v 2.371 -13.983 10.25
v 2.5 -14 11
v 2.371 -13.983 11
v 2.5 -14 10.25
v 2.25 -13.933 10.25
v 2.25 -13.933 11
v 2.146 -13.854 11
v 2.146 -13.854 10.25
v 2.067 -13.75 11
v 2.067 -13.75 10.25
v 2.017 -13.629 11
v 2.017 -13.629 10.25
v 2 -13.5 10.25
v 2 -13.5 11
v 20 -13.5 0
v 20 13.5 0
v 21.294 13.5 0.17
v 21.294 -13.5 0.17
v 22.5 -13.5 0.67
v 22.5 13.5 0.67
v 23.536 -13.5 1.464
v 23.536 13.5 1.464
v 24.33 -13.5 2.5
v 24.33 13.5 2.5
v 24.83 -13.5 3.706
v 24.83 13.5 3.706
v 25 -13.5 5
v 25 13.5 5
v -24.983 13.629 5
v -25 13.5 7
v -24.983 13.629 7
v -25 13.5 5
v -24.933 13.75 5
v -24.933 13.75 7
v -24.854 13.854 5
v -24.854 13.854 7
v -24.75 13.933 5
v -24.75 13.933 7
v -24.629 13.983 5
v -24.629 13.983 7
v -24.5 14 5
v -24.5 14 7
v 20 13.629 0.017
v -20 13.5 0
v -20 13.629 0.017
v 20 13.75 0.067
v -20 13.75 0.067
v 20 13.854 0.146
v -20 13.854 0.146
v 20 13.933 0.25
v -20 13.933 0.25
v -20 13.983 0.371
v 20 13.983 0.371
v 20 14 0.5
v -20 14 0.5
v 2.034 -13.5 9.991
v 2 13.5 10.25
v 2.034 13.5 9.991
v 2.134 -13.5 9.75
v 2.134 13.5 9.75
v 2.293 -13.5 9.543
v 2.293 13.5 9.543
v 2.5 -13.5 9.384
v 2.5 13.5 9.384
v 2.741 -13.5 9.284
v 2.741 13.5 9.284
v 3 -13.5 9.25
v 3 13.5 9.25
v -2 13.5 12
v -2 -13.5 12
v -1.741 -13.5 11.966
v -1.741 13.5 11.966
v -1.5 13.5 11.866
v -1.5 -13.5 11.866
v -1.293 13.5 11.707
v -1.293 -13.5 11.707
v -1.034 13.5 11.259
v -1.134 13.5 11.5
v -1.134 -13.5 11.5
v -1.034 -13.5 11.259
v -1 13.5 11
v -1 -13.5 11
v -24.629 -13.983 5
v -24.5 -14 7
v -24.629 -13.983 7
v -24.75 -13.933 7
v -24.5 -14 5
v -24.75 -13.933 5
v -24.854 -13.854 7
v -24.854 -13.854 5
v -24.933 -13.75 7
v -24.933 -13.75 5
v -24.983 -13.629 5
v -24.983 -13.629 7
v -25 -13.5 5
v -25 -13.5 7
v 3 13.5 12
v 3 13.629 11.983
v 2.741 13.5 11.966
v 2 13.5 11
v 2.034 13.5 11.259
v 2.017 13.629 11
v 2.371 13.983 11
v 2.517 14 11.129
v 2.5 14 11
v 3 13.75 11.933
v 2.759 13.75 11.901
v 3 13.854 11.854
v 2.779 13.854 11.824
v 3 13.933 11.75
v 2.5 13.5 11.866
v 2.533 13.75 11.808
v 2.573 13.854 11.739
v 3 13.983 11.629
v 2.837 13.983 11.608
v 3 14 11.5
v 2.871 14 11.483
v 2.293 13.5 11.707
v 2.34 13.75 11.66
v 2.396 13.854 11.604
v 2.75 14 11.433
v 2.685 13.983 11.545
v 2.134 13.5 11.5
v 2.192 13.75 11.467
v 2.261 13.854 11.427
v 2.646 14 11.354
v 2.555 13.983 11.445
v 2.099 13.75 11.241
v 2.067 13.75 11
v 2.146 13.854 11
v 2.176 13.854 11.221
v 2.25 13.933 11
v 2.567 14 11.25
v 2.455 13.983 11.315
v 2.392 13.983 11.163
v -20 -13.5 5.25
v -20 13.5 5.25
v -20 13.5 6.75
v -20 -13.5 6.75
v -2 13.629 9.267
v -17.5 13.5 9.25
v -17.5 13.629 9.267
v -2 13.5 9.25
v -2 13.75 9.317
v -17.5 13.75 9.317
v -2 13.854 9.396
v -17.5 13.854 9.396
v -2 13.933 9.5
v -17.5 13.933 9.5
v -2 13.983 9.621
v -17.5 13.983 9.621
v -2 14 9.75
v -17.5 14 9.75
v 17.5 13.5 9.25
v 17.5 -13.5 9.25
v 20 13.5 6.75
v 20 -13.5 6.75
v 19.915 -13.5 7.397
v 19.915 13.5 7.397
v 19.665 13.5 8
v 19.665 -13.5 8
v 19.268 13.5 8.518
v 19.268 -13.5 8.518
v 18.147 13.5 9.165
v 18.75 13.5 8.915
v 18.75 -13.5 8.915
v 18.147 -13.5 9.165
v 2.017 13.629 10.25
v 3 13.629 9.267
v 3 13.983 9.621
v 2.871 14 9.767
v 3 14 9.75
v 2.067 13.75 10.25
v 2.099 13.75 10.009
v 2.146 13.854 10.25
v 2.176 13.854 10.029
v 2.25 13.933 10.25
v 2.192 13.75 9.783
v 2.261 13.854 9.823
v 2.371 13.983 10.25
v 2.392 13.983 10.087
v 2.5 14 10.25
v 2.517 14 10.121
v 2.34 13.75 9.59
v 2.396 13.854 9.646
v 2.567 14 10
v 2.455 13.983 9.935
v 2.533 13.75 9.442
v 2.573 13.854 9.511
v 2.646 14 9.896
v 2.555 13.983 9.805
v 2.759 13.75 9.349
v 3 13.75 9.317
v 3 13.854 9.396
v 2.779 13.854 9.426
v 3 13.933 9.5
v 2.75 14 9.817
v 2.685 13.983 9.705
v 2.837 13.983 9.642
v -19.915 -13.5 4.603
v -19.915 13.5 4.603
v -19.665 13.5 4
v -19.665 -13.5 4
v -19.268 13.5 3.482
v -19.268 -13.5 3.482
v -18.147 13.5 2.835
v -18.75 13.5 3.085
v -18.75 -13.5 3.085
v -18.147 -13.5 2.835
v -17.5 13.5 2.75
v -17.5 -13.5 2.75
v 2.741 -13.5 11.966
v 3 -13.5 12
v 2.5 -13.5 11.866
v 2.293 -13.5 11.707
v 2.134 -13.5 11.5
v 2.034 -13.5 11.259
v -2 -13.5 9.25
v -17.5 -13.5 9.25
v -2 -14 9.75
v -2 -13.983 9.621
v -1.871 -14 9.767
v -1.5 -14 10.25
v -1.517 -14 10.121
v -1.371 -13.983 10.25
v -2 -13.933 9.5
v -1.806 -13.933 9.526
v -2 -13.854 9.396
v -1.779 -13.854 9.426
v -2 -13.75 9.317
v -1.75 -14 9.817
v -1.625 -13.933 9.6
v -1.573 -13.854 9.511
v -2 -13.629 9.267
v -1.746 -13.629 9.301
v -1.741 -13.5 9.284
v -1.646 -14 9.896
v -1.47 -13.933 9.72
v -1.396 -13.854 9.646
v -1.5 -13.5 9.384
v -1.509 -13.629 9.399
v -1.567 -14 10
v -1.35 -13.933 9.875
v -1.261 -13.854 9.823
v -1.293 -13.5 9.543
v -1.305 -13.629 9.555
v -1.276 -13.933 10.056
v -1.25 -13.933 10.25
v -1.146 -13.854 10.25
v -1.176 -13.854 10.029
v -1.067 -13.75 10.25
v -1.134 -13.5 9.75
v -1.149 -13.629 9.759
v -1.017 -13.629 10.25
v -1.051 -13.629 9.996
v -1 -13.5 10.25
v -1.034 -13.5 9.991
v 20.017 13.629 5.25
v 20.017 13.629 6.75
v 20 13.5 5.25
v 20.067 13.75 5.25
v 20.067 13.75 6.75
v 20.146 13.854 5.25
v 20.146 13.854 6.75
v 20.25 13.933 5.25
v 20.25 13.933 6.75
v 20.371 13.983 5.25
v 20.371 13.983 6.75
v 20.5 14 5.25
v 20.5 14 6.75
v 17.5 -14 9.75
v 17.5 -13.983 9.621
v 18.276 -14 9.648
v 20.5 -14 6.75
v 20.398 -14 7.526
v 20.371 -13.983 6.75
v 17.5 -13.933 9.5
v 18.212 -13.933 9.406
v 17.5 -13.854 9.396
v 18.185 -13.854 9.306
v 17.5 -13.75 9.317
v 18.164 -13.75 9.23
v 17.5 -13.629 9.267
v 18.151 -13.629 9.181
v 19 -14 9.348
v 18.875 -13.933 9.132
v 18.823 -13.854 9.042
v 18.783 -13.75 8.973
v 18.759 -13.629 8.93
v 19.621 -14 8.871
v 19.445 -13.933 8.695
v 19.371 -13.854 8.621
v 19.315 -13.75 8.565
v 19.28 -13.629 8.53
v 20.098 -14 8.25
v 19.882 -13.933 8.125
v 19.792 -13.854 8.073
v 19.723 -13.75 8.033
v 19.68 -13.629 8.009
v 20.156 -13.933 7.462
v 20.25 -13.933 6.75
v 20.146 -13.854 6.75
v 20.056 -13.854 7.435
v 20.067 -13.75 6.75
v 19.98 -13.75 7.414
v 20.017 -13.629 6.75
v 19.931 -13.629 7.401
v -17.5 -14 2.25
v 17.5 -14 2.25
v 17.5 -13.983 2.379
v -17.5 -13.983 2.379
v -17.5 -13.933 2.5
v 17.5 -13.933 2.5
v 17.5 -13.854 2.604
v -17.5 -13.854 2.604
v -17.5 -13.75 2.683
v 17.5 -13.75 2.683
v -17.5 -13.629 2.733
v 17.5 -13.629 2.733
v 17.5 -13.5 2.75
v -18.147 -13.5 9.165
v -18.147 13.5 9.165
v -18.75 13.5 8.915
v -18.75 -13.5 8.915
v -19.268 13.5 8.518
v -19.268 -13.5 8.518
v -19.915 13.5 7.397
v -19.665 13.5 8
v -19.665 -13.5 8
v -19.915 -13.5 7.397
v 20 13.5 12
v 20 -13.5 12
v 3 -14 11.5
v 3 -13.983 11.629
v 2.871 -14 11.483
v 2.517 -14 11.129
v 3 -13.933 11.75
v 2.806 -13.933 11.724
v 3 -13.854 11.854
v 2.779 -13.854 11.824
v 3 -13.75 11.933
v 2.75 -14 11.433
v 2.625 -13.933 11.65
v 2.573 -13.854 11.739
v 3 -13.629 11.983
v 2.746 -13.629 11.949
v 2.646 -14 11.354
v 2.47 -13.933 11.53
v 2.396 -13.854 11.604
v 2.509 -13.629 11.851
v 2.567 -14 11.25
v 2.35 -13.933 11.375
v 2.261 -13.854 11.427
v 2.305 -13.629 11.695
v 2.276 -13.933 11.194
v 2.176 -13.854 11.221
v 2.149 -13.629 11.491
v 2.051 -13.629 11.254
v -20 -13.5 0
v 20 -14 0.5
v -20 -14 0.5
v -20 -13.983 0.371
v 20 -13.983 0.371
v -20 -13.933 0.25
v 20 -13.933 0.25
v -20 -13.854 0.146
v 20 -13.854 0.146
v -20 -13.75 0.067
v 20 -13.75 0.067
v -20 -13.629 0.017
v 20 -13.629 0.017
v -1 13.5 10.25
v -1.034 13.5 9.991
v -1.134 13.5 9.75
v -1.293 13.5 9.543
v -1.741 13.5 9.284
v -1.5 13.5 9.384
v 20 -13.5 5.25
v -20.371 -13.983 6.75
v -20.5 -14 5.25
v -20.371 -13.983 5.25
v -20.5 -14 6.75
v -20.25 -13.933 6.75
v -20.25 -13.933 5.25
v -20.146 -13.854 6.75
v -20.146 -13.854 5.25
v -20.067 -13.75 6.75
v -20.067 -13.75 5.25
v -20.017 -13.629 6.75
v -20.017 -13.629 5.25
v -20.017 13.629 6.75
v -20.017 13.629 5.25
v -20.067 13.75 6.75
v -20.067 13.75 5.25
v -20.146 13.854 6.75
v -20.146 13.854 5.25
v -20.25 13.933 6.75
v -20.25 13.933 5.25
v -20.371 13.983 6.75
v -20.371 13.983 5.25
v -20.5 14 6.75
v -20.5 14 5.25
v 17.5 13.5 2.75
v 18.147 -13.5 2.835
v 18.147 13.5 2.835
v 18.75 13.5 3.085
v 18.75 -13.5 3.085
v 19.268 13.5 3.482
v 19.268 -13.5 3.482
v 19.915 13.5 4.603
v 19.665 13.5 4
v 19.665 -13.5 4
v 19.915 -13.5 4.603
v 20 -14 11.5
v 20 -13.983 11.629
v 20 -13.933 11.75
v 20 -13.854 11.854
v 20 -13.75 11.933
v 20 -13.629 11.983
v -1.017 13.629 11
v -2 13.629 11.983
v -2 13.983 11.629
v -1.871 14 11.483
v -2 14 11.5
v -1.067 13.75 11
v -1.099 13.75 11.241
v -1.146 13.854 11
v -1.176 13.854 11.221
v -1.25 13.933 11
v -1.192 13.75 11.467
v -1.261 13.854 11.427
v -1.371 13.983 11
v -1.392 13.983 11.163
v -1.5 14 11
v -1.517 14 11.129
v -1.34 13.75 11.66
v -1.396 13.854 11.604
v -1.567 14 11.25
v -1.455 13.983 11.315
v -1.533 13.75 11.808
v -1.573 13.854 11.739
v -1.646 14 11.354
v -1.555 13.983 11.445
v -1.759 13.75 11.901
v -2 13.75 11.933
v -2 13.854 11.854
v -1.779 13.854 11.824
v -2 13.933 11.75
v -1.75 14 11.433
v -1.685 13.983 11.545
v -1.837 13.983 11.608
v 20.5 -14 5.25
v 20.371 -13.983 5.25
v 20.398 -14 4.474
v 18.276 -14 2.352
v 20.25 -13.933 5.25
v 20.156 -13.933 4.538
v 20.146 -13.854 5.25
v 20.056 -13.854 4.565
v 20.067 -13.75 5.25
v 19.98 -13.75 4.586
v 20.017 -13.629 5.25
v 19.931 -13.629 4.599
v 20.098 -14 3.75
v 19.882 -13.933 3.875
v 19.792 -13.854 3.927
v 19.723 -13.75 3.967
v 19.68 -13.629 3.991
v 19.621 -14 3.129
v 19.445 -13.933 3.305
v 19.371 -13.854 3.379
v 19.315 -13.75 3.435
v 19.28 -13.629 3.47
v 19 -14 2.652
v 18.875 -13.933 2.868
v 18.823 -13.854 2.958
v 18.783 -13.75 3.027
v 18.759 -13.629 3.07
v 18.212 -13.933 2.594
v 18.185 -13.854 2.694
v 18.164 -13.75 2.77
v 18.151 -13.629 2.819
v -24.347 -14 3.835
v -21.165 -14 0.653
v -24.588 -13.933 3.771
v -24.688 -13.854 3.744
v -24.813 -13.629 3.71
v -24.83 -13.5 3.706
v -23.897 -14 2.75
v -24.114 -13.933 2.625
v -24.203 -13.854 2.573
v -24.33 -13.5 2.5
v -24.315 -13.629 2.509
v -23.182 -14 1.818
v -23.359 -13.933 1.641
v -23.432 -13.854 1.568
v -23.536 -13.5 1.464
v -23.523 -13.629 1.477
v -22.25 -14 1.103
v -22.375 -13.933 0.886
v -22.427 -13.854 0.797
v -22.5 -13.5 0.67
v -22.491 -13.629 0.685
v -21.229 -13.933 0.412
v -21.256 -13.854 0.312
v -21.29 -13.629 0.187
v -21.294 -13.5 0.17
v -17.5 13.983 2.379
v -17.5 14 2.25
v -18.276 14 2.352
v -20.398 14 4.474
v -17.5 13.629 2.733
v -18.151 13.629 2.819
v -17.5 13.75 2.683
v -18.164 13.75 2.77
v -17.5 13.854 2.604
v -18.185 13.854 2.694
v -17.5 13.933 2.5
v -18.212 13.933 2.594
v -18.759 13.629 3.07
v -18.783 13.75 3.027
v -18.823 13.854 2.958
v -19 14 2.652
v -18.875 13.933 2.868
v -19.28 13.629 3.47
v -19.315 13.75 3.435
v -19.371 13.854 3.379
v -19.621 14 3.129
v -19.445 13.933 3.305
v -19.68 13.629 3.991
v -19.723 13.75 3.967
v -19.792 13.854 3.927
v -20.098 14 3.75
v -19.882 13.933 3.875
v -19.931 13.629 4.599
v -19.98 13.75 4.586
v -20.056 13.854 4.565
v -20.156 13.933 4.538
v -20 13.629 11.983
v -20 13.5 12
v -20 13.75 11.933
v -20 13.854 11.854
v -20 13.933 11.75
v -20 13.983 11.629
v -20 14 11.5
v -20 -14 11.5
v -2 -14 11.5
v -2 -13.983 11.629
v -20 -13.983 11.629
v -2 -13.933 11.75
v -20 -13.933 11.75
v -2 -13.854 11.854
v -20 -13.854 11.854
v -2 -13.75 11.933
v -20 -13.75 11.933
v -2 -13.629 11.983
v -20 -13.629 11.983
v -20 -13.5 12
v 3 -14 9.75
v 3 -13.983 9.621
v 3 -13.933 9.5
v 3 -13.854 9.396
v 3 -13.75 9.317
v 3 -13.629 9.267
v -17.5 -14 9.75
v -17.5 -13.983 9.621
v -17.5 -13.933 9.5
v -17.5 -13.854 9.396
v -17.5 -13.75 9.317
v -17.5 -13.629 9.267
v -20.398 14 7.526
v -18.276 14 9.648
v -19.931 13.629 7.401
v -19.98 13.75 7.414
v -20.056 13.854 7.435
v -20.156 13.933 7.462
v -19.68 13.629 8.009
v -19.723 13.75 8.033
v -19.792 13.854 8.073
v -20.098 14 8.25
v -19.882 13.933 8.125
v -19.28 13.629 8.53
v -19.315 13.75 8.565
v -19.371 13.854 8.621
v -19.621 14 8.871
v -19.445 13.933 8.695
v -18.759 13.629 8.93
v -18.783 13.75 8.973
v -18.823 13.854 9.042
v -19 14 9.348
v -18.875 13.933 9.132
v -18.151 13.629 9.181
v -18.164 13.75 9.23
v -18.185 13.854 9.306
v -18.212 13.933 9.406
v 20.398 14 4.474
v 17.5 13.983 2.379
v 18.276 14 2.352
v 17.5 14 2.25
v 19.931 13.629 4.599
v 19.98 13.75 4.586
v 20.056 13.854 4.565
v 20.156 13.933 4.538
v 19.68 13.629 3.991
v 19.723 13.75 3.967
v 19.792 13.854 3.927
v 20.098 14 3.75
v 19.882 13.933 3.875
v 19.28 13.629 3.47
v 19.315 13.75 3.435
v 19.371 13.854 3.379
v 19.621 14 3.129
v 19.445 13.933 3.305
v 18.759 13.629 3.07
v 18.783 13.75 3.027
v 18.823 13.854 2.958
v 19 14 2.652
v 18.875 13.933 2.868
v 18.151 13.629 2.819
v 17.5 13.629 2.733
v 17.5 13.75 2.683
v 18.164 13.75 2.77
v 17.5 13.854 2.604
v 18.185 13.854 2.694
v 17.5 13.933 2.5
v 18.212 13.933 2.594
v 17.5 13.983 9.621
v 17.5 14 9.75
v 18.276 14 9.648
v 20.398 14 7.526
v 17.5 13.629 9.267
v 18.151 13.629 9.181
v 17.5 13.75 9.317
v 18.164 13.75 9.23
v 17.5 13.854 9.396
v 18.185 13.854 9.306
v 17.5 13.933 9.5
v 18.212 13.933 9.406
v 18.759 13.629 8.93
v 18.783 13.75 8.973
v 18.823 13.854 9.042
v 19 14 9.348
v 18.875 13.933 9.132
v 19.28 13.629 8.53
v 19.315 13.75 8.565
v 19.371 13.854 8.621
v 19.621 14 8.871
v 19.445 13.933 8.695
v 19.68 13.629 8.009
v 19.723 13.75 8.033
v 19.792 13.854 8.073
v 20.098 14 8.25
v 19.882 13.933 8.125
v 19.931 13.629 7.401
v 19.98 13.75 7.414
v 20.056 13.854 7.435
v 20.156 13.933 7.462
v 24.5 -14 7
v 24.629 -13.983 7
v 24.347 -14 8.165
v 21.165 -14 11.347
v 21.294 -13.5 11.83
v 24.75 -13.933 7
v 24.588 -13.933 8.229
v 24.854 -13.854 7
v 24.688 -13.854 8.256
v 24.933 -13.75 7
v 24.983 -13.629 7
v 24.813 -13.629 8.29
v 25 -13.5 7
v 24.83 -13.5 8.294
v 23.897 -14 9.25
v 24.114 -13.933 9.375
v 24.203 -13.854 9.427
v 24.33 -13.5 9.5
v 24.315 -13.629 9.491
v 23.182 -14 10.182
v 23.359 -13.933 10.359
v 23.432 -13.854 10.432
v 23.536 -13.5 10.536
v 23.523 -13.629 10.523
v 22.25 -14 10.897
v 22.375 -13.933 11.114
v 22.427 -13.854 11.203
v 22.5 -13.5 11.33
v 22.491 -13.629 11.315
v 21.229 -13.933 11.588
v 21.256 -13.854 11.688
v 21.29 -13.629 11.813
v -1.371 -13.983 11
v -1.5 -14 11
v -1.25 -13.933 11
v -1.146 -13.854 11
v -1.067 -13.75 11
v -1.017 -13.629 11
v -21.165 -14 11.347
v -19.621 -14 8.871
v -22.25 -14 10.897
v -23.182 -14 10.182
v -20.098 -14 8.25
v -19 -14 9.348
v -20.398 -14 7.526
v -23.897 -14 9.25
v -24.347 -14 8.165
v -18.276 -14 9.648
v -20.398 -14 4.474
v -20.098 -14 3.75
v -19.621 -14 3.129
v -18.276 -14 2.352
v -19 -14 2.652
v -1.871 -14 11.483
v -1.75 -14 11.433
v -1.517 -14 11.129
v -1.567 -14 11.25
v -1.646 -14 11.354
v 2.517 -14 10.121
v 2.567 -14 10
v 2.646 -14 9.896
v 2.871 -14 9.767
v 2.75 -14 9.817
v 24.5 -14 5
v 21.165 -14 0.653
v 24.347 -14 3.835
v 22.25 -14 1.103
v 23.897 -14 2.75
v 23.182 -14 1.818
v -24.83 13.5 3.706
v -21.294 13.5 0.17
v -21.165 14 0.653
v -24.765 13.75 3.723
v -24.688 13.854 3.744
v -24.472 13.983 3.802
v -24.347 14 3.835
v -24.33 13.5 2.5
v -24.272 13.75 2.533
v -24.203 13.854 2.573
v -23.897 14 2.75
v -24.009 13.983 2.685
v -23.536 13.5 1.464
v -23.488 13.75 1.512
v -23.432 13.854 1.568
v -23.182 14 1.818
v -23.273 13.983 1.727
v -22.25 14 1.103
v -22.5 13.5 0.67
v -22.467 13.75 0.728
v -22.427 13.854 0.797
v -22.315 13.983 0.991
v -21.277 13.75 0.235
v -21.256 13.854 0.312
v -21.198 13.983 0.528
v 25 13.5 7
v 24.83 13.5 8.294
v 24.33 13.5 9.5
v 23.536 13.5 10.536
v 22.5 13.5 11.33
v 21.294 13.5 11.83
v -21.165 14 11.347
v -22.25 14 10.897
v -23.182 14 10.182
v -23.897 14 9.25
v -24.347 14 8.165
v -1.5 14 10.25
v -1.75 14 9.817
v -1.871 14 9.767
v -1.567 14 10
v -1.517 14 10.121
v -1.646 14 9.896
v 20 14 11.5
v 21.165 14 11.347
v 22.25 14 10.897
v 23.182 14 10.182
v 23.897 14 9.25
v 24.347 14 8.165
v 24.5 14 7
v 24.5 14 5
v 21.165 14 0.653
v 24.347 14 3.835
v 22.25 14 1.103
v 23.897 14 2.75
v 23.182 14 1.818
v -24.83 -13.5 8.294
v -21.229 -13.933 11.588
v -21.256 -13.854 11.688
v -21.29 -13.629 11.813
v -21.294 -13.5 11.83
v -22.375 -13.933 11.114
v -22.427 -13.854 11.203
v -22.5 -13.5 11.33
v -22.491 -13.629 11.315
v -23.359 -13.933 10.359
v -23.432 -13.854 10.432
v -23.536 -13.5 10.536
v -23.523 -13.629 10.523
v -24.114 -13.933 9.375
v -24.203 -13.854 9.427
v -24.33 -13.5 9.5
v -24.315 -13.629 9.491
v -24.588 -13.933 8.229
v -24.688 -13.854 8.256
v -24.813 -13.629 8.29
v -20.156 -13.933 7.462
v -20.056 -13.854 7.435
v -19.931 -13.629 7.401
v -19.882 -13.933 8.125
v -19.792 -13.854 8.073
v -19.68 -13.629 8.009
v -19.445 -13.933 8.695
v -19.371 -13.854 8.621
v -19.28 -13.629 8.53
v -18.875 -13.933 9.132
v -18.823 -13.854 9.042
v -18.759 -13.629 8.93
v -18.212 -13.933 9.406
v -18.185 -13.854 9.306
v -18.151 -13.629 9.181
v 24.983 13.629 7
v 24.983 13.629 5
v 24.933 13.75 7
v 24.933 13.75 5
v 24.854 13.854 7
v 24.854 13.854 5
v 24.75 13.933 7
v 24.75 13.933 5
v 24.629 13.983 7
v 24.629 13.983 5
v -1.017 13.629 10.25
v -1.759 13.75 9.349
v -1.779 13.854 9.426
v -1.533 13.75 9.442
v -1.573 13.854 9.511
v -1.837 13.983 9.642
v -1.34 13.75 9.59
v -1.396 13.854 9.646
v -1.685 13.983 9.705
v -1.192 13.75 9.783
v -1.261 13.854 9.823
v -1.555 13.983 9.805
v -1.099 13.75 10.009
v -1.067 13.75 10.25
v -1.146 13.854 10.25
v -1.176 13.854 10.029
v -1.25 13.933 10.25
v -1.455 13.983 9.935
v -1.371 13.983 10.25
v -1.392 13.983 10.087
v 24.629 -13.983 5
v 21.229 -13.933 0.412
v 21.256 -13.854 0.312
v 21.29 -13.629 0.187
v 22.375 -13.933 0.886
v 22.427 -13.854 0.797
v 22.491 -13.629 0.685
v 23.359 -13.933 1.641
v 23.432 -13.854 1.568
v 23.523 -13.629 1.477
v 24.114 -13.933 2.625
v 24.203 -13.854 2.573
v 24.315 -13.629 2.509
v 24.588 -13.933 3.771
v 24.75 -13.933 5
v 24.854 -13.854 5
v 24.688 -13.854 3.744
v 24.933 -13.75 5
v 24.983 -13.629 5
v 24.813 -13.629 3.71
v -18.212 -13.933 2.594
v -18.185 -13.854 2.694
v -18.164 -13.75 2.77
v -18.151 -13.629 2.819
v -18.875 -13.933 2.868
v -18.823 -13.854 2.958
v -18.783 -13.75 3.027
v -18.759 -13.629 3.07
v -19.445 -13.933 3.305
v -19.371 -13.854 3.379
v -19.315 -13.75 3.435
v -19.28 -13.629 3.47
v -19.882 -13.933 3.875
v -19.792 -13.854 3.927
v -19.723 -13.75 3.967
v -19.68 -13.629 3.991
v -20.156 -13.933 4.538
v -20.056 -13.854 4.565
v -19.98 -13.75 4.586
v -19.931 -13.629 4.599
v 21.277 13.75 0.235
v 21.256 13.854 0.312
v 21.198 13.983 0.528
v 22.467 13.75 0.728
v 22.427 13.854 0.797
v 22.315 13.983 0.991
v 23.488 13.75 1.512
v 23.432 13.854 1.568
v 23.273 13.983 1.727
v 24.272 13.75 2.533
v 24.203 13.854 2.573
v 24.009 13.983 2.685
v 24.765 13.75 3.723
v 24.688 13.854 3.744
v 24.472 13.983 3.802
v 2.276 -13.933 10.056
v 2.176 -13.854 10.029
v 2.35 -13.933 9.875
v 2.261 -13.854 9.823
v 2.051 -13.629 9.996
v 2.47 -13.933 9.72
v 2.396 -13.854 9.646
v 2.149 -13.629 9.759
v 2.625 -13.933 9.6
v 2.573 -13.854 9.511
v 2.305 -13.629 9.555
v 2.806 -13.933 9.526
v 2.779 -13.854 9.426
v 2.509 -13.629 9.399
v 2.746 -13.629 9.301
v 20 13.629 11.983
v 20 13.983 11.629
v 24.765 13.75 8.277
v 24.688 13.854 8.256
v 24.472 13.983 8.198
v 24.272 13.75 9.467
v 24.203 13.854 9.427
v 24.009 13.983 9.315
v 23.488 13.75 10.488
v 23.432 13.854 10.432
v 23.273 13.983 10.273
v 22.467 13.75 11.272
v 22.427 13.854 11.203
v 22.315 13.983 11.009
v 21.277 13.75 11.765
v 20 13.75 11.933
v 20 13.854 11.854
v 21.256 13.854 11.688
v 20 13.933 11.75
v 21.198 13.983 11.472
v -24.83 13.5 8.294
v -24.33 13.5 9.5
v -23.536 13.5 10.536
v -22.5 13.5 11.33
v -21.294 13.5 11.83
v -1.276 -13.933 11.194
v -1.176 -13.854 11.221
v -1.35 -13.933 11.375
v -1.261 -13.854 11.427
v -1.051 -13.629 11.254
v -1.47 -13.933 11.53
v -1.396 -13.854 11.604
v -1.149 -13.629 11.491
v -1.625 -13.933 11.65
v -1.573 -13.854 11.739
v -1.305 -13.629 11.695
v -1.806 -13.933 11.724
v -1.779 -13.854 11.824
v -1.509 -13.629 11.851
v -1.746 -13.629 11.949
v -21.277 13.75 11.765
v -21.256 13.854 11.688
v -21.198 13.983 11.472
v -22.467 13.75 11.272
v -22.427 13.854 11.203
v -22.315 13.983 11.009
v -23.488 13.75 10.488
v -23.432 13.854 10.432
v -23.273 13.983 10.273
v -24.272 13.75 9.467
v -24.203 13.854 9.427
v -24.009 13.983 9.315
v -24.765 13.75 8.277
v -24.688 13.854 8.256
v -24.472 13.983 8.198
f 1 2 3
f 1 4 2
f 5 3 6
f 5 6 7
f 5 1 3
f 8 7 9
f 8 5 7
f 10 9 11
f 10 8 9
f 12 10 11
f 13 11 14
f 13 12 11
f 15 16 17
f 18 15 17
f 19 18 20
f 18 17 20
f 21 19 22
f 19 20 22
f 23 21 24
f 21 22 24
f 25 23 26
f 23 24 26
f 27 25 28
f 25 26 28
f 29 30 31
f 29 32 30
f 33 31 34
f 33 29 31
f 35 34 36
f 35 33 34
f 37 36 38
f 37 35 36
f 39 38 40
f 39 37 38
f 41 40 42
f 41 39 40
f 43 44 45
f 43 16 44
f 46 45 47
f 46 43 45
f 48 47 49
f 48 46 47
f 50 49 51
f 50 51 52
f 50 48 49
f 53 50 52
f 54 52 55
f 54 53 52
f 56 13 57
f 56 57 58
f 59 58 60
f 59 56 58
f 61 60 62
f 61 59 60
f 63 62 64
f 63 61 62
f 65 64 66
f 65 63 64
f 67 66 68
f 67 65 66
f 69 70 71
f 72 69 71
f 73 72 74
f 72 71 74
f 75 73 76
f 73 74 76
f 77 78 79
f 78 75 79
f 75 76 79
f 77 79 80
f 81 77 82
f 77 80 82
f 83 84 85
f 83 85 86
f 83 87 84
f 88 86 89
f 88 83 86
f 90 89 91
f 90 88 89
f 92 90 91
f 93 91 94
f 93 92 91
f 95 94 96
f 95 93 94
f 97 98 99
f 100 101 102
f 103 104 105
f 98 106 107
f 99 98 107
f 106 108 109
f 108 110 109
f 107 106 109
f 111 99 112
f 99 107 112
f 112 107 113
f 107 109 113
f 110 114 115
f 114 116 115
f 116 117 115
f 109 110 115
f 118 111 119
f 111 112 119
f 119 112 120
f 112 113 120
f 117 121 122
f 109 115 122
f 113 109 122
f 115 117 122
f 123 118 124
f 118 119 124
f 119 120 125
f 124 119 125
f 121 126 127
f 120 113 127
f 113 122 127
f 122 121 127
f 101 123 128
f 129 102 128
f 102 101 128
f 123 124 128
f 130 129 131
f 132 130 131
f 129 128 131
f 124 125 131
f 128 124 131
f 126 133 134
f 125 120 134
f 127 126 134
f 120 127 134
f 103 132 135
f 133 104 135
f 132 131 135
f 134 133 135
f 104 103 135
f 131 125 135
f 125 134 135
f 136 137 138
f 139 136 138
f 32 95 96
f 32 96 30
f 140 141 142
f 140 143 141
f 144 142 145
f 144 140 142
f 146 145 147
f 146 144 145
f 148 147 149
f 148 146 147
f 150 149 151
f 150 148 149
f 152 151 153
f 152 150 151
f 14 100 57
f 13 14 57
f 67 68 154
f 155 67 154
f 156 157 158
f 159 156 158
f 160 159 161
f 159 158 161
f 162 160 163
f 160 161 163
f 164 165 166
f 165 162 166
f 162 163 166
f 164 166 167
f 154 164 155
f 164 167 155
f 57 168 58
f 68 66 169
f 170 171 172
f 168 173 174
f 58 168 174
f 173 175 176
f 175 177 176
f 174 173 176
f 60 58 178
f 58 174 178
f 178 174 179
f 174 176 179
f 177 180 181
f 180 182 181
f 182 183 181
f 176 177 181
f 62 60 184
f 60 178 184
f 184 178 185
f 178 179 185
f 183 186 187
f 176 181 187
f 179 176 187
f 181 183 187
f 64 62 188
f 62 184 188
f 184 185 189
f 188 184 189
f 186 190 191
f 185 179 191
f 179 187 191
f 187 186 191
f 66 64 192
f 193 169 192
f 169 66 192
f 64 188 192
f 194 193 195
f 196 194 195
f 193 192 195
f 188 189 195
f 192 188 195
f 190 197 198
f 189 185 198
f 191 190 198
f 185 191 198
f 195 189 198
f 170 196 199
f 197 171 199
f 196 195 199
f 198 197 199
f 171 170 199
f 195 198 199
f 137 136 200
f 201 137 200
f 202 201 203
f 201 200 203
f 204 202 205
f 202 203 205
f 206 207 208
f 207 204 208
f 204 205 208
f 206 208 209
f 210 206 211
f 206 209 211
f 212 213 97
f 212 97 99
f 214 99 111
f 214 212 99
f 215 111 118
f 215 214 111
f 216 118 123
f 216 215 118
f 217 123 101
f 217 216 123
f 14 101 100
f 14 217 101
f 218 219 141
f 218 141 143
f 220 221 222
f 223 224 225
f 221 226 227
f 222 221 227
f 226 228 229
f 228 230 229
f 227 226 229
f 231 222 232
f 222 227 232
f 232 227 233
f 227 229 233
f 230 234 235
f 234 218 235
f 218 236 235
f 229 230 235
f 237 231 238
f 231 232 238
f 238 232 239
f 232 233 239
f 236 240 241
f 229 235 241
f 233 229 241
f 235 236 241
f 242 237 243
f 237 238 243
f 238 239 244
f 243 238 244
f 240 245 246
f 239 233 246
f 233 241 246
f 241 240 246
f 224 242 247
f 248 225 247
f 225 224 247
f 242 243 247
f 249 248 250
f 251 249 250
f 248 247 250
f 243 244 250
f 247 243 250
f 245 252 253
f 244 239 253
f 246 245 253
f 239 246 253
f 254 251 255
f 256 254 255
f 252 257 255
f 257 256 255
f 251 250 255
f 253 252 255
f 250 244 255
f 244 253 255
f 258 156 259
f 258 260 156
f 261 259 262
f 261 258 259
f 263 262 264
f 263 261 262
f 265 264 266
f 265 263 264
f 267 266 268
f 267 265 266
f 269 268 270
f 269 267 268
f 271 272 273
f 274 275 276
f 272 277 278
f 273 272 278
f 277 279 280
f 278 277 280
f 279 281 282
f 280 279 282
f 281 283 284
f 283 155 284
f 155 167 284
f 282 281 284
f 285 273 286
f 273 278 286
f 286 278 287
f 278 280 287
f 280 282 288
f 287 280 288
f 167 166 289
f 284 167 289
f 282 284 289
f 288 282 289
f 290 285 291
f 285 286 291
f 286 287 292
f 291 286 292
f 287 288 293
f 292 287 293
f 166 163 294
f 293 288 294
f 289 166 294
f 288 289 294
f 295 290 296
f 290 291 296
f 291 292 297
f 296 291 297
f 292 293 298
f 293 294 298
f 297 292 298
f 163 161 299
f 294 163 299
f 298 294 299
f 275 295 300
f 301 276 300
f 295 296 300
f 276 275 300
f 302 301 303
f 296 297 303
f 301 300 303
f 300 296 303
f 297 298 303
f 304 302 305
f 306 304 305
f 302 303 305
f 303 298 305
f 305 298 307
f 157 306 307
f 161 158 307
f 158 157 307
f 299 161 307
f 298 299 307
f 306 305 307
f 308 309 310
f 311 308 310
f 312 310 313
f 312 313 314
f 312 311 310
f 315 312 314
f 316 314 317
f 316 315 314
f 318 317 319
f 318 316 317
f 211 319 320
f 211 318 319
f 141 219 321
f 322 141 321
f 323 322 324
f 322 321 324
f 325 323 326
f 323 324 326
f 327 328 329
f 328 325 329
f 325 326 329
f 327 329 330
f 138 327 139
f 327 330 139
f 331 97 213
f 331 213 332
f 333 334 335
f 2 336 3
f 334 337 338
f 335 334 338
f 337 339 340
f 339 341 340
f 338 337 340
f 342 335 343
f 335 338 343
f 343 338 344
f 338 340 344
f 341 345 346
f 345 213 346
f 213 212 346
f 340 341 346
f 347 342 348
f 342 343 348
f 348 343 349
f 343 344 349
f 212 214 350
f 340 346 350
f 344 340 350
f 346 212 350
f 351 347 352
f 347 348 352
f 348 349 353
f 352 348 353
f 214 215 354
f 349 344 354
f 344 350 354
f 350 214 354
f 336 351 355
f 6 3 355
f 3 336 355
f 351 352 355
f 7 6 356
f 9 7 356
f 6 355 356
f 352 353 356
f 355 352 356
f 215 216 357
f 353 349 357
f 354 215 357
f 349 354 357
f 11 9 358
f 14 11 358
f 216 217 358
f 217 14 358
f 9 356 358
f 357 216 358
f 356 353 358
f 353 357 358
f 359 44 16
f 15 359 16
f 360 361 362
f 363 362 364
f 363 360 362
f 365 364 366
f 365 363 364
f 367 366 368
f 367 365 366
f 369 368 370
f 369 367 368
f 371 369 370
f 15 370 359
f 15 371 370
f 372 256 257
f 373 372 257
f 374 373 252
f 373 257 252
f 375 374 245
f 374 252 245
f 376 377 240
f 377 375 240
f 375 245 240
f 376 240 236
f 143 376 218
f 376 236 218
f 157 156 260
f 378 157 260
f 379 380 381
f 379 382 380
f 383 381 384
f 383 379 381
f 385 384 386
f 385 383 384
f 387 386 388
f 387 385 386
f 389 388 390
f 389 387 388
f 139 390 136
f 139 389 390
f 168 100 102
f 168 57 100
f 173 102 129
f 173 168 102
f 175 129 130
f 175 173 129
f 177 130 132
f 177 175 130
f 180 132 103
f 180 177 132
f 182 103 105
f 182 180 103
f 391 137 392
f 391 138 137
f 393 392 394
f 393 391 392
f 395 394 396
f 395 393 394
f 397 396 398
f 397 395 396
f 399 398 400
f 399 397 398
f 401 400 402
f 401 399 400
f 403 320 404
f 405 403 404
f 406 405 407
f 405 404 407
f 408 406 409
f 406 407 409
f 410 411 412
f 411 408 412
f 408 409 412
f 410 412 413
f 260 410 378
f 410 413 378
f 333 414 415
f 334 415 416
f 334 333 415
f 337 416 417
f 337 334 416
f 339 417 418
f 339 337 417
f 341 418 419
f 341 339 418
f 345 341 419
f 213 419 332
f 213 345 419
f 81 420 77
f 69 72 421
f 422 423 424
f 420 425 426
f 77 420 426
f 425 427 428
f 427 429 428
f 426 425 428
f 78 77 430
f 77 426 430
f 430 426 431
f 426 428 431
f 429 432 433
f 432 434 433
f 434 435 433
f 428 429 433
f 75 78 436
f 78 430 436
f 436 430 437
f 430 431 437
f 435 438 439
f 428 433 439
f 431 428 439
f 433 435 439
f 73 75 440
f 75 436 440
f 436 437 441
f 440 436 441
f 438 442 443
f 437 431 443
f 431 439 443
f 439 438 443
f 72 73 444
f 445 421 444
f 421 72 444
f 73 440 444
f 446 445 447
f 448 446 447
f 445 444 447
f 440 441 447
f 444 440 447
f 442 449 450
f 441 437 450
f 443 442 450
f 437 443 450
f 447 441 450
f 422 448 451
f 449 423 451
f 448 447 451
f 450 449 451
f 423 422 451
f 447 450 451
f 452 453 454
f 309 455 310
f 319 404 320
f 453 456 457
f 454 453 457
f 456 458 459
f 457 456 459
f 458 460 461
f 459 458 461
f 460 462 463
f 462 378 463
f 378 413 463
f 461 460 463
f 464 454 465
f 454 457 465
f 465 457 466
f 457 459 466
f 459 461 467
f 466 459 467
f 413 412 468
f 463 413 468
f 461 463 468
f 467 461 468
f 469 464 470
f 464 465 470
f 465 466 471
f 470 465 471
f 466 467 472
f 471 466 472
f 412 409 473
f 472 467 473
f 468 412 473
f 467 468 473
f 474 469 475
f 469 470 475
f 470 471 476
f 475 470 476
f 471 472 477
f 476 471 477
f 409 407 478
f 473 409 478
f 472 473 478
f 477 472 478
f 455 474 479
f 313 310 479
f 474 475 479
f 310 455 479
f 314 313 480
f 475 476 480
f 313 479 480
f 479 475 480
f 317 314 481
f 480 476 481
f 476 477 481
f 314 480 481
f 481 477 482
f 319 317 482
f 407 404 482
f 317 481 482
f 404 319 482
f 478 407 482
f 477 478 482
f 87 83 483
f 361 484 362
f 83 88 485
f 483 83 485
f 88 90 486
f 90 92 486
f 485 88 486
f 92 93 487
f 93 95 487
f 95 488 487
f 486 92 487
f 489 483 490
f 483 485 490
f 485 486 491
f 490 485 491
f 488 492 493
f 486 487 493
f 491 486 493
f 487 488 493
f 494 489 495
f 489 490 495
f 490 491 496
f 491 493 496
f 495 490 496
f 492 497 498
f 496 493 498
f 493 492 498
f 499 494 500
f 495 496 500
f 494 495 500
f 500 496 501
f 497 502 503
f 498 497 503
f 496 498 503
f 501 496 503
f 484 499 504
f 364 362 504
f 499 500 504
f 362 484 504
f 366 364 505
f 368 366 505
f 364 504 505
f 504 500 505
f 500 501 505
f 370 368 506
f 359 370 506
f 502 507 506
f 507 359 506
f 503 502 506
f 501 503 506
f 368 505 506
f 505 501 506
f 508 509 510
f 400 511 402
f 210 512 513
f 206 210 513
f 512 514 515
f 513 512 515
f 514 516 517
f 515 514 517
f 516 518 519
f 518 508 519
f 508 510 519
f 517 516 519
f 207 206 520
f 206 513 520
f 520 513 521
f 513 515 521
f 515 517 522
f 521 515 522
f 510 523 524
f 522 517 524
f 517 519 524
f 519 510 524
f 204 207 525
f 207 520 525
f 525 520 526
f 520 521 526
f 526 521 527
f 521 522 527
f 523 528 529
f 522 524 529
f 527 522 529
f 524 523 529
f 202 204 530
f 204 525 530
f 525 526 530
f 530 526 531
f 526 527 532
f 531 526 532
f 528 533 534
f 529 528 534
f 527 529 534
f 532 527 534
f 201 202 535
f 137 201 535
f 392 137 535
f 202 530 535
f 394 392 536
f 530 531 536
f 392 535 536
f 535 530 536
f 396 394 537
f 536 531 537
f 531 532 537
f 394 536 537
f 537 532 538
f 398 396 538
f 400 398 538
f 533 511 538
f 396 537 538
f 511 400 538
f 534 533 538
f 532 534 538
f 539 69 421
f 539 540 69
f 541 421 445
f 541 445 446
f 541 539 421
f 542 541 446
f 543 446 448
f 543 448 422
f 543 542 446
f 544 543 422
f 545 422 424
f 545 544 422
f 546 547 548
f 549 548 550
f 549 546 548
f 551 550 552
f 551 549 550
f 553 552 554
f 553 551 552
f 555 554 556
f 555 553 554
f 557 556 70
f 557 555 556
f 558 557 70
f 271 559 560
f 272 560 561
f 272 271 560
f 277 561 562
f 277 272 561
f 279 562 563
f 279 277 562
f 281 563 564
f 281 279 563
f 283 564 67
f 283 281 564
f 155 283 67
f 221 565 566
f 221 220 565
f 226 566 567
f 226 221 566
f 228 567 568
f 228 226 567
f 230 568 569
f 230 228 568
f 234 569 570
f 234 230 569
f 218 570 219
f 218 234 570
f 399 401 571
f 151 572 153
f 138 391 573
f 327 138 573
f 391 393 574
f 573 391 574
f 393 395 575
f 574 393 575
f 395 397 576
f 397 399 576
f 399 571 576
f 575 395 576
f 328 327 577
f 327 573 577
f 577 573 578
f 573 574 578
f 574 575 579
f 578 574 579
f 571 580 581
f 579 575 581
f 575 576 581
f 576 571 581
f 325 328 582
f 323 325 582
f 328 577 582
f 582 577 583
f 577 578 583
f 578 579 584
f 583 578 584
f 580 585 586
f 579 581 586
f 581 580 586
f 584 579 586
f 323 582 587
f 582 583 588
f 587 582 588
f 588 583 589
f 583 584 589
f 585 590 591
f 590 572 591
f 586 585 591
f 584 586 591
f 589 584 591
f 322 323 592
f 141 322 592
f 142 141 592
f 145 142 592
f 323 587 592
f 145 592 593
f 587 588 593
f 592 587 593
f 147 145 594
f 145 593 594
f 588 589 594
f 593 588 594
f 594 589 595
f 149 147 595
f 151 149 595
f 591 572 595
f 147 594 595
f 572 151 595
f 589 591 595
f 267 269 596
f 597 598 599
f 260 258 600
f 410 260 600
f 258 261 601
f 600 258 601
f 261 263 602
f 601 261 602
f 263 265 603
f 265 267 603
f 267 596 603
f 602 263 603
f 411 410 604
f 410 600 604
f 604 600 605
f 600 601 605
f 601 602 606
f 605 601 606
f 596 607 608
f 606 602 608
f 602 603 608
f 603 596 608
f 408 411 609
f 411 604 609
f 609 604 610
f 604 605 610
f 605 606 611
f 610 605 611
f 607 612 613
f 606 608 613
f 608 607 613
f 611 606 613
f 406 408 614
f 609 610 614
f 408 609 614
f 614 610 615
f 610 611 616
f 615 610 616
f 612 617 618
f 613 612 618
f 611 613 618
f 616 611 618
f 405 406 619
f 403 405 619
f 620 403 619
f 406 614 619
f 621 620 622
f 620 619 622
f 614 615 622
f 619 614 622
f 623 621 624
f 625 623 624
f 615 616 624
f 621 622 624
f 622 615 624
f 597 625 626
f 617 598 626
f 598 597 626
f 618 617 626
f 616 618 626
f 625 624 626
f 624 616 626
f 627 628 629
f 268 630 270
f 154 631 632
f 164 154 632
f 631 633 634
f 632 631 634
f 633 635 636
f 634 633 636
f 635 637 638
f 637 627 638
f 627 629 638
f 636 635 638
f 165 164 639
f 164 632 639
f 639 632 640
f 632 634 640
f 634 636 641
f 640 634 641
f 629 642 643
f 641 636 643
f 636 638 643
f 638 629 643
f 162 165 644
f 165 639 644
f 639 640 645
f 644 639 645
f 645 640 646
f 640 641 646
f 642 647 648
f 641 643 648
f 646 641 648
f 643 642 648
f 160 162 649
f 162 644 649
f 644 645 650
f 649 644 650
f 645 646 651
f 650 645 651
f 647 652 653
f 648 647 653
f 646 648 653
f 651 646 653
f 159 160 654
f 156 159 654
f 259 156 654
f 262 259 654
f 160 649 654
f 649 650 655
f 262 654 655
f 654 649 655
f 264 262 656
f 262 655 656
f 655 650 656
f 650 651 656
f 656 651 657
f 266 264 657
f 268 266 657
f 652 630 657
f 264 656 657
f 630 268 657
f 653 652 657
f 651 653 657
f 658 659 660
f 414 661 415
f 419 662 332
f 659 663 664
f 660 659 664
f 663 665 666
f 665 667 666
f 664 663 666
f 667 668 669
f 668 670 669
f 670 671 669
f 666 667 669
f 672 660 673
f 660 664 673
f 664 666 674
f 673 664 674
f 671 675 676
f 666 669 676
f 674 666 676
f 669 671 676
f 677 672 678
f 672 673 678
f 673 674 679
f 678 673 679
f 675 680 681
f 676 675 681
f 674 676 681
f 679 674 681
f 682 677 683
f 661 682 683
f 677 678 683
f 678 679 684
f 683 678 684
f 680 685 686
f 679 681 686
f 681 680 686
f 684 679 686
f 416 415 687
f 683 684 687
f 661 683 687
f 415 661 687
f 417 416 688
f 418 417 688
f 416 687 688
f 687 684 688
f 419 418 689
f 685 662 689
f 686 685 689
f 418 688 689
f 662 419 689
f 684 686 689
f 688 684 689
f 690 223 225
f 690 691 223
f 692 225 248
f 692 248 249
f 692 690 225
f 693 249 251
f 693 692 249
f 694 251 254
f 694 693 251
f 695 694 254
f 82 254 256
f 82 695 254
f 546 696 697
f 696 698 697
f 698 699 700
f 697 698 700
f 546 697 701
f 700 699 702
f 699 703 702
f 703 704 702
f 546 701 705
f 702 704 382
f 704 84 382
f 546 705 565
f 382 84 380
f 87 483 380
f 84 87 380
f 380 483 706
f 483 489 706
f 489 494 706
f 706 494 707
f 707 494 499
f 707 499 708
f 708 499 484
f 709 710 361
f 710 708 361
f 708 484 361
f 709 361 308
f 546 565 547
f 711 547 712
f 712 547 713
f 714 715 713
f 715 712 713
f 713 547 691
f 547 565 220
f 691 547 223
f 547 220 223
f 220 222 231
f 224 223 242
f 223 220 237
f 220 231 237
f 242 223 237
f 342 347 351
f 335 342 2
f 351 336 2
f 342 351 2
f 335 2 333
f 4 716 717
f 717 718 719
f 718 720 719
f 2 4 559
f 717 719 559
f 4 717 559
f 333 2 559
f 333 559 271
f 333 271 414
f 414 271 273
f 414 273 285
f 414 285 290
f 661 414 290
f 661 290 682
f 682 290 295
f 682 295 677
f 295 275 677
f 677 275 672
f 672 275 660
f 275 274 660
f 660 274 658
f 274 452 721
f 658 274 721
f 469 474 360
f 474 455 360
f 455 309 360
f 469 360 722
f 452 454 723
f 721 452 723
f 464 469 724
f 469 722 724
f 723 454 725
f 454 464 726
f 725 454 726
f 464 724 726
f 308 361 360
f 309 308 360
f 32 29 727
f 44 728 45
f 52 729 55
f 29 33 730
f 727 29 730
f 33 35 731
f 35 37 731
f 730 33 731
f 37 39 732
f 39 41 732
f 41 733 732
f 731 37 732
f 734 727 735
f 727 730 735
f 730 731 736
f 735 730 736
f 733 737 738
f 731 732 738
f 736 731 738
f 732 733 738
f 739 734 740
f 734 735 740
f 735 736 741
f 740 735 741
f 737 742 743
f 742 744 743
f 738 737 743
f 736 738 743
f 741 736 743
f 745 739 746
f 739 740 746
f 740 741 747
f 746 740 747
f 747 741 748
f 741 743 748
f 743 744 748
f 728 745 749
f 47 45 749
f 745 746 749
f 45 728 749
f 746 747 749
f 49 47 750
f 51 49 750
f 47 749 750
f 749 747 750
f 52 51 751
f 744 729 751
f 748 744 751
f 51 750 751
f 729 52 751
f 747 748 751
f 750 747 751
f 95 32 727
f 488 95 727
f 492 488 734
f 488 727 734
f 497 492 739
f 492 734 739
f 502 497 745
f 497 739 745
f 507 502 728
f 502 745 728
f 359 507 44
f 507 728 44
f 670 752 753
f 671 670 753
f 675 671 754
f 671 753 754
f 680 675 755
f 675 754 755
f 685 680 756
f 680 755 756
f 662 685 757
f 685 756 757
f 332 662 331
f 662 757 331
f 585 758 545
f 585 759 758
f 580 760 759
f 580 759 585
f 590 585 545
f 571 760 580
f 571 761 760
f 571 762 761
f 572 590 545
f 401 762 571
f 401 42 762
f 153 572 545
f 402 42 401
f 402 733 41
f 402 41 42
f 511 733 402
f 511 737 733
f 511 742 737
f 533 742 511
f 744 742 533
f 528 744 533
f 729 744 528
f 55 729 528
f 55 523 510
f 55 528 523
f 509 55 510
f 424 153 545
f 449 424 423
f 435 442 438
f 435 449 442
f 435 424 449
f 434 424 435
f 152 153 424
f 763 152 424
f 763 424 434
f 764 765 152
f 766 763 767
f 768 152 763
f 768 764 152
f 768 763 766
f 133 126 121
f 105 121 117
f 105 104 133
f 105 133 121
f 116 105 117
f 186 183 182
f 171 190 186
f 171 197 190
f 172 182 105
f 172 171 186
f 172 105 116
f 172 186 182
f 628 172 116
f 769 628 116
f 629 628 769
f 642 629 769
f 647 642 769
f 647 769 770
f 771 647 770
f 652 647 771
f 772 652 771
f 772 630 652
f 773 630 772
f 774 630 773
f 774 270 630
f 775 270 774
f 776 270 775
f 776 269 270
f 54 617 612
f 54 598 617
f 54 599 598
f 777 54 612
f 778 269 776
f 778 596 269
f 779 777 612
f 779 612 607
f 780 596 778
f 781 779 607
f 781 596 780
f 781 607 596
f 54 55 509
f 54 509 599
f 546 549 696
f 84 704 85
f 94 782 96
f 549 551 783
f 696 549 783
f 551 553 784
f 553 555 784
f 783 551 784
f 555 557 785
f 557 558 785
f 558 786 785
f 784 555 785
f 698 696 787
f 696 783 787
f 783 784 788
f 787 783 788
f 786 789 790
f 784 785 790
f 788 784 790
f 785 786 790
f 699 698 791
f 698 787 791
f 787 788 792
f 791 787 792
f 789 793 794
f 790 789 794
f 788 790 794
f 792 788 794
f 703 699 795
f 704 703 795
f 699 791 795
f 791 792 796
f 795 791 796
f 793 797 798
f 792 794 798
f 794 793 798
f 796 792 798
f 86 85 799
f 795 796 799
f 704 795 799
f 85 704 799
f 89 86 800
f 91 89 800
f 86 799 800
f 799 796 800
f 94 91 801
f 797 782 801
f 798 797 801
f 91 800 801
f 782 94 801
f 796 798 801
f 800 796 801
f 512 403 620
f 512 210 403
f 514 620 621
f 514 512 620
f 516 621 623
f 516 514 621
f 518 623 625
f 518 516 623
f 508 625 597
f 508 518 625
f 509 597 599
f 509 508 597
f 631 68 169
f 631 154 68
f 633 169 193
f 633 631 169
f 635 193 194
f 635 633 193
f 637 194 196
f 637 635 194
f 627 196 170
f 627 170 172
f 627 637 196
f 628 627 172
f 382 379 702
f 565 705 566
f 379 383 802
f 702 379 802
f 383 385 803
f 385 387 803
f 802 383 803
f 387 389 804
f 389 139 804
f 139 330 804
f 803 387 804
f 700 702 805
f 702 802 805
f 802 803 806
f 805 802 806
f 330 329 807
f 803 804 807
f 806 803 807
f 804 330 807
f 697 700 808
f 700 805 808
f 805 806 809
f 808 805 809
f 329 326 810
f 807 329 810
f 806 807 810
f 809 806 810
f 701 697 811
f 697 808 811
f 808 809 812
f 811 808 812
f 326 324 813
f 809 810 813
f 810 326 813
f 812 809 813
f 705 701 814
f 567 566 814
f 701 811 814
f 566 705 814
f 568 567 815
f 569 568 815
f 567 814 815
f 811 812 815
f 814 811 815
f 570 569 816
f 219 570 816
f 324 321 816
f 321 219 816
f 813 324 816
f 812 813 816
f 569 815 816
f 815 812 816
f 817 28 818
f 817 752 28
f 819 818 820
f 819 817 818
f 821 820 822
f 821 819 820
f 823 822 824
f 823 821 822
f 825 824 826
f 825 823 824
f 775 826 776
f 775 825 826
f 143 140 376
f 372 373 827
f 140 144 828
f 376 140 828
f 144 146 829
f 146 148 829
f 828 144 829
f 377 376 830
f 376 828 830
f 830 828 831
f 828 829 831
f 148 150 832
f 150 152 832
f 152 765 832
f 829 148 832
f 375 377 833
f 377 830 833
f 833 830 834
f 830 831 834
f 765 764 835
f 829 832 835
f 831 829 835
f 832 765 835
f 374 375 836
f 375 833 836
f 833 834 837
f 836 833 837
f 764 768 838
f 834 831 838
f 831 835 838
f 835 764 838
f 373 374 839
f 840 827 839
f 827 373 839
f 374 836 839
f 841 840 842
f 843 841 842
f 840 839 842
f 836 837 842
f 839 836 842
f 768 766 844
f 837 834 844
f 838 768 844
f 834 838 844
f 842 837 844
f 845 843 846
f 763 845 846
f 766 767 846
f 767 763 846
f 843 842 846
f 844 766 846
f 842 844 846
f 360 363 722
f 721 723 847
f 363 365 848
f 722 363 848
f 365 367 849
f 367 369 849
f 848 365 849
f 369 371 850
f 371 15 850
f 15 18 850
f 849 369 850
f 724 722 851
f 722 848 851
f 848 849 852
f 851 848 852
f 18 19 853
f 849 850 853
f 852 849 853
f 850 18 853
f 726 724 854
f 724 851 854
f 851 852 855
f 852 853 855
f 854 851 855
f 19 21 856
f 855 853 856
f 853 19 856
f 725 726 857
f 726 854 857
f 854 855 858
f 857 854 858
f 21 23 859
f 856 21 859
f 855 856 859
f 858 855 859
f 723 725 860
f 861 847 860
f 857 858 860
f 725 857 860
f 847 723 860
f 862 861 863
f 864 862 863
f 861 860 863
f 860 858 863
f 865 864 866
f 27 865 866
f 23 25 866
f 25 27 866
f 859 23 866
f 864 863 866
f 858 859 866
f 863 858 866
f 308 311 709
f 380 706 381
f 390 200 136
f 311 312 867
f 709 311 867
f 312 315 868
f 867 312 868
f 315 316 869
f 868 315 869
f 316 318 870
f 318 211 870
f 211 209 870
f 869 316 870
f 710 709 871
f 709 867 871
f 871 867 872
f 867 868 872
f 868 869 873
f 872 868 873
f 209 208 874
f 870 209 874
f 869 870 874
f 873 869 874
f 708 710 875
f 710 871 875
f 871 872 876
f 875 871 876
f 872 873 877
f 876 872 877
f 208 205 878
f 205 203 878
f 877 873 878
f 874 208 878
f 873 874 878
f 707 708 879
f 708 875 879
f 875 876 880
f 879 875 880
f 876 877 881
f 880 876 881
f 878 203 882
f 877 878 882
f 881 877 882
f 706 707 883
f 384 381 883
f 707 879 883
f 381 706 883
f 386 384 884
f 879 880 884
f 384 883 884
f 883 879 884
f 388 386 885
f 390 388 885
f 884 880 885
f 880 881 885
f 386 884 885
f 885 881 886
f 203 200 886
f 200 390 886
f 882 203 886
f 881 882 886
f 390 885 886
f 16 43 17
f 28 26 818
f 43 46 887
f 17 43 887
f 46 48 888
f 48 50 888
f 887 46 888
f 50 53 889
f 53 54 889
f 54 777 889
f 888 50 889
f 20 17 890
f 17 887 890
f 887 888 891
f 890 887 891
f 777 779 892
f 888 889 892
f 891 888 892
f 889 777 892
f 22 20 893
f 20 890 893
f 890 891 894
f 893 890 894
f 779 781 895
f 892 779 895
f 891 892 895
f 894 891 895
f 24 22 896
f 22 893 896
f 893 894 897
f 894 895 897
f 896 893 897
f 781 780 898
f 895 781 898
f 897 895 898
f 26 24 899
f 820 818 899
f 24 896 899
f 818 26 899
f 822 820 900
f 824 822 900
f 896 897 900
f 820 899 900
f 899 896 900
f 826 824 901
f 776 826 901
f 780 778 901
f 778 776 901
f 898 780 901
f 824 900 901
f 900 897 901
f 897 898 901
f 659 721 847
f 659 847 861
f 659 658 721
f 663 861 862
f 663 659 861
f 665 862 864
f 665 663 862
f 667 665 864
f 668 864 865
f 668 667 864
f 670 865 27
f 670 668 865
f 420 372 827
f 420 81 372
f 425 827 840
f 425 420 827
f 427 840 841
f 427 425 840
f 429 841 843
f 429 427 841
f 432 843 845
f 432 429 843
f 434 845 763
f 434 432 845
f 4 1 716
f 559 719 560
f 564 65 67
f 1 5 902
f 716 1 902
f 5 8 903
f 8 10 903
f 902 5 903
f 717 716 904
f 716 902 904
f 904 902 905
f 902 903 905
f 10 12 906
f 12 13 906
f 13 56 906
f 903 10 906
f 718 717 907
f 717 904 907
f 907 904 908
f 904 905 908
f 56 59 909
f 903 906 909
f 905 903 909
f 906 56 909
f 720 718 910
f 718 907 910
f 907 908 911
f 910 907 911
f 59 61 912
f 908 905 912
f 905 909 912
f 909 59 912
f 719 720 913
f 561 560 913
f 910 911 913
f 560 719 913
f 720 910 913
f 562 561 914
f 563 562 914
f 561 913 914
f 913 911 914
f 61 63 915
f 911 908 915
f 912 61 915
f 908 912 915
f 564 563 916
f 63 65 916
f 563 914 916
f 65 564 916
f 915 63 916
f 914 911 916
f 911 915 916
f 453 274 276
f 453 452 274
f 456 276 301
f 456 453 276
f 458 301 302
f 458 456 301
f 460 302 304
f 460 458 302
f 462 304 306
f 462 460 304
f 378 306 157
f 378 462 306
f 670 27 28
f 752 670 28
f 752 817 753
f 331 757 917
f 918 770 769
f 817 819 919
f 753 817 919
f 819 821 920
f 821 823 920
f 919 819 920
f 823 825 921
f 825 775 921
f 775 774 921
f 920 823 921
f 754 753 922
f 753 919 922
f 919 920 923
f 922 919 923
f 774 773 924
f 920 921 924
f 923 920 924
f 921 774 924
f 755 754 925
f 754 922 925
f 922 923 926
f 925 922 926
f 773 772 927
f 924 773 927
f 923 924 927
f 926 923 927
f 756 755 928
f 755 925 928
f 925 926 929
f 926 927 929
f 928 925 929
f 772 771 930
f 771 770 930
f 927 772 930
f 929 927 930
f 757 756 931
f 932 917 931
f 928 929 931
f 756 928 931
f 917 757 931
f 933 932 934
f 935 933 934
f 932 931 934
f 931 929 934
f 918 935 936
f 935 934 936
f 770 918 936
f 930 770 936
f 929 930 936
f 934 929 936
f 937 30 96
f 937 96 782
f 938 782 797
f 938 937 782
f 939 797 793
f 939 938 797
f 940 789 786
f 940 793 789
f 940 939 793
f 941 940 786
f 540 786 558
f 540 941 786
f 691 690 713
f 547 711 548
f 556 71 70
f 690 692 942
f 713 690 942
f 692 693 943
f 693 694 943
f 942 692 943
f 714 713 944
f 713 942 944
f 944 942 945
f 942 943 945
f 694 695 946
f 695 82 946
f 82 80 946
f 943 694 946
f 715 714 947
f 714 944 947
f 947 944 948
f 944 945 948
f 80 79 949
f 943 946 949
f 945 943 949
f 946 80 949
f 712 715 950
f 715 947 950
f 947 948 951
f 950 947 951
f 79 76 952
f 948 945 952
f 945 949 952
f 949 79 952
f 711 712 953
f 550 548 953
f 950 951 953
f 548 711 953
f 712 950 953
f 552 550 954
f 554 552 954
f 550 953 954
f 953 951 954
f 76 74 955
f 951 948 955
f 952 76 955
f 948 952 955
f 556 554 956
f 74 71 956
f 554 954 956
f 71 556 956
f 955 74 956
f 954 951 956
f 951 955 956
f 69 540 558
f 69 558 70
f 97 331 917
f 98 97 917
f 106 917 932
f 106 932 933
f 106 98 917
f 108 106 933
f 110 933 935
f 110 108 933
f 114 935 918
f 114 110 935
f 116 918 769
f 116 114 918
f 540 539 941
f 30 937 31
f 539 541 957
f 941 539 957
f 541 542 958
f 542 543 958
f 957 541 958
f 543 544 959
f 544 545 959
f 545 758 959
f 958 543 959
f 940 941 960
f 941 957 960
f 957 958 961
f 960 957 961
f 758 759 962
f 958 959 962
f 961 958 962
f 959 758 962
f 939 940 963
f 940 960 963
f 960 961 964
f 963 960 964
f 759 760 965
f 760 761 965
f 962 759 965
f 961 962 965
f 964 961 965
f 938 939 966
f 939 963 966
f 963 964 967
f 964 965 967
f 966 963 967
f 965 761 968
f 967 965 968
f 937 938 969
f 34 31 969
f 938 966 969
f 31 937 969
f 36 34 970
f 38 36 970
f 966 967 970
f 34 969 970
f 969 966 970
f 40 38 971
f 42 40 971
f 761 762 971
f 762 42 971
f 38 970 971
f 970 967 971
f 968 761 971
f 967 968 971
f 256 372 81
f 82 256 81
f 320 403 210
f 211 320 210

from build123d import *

# Parameters (mm, degrees)
F0_W     = 50
F0_H     = 28
F1_DEPTH = 12
F3_DEPTH = 28.001
F4_R     = 5
F5_R     = 1
F6_R     = 2.5
F7_R     = 0.5


with BuildPart() as f1:
    # F0 (on Top) → F1 (new body)
    with BuildSketch(Plane.XY):
        Rectangle(F0_W, F0_H)
    extrude(amount=F1_DEPTH)

    # F2 (on face) → F3 (cut, through all)
    with BuildSketch(Plane(origin=(0, 14, 0), x_dir=(-1, 0, 0), z_dir=(0, 1, 0))):
        Polygon((-2, 9.25), (-20, 9.25), (-20, 2.75), (20, 2.75), (20, 9.25), (1, 9.25), (1, 12), (-2, 12), align=None)
    extrude(amount=-F3_DEPTH, mode=Mode.SUBTRACT)

    # F4
    f4_edges = [f1.edges().sort_by_distance(p)[0] for p in [
        (25, 0, 0),
        (25, 0, 12),
        (-25, 0, 0),
        (-25, 0, 12),
    ]]
    fillet(f4_edges, radius=F4_R)

    # F5
    f5_edges = [f1.edges().sort_by_distance(p)[0] for p in [
        (-1, 0, 12),
        (2, 0, 12),
        (2, 0, 9.25),
        (-1, 0, 9.25),
    ]]
    fillet(f5_edges, radius=F5_R)

    # F6
    f6_edges = [f1.edges().sort_by_distance(p)[0] for p in [
        (-20, 0, 2.75),
        (-20, 0, 9.25),
        (20, 0, 9.25),
        (20, 0, 2.75),
    ]]
    fillet(f6_edges, radius=F6_R)

    # F7
    f7_edges = [f1.edges().sort_by_distance(p)[0] for p in [
        (10.25, 14, 9.25),
        (19.267767, 14, 8.517767),
        (2.292893, 14, 9.542893),
        (20, 14, 6),
        (2, 14, 10.625),
        (19.267767, 14, 3.482233),
        (2.292893, 14, 11.707107),
        (0, 14, 2.75),
        (11.5, 14, 12),
        (-19.267767, 14, 3.482233),
        (23.535534, 14, 10.535534),
        (-20, 14, 6),
        (25, 14, 6),
        (-19.267767, 14, 8.517767),
        (23.535534, 14, 1.464466),
        (-9.75, 14, 9.25),
        (0, 14, 0),
        (-1.292893, 14, 9.542893),
        (-23.535534, 14, 1.464466),
        (-1, 14, 10.625),
        (-25, 14, 6),
        (-1.292893, 14, 11.707107),
        (-23.535534, 14, 10.535534),
        (-11, 14, 12),
        (-9.75, -14, 9.25),
        (-19.267767, -14, 8.517767),
        (-1.292893, -14, 9.542893),
        (-20, -14, 6),
        (-1, -14, 10.625),
        (-19.267767, -14, 3.482233),
        (-1.292893, -14, 11.707107),
        (0, -14, 2.75),
        (-11, -14, 12),
        (19.267767, -14, 3.482233),
        (-23.535534, -14, 10.535534),
        (20, -14, 6),
        (-25, -14, 6),
        (19.267767, -14, 8.517767),
        (-23.535534, -14, 1.464466),
        (10.25, -14, 9.25),
        (0, -14, 0),
        (2.292893, -14, 9.542893),
        (23.535534, -14, 1.464466),
        (2, -14, 10.625),
        (25, -14, 6),
        (2.292893, -14, 11.707107),
        (23.535534, -14, 10.535534),
        (11.5, -14, 12),
    ]]
    fillet(f7_edges, radius=F7_R)


solid = f1.part
